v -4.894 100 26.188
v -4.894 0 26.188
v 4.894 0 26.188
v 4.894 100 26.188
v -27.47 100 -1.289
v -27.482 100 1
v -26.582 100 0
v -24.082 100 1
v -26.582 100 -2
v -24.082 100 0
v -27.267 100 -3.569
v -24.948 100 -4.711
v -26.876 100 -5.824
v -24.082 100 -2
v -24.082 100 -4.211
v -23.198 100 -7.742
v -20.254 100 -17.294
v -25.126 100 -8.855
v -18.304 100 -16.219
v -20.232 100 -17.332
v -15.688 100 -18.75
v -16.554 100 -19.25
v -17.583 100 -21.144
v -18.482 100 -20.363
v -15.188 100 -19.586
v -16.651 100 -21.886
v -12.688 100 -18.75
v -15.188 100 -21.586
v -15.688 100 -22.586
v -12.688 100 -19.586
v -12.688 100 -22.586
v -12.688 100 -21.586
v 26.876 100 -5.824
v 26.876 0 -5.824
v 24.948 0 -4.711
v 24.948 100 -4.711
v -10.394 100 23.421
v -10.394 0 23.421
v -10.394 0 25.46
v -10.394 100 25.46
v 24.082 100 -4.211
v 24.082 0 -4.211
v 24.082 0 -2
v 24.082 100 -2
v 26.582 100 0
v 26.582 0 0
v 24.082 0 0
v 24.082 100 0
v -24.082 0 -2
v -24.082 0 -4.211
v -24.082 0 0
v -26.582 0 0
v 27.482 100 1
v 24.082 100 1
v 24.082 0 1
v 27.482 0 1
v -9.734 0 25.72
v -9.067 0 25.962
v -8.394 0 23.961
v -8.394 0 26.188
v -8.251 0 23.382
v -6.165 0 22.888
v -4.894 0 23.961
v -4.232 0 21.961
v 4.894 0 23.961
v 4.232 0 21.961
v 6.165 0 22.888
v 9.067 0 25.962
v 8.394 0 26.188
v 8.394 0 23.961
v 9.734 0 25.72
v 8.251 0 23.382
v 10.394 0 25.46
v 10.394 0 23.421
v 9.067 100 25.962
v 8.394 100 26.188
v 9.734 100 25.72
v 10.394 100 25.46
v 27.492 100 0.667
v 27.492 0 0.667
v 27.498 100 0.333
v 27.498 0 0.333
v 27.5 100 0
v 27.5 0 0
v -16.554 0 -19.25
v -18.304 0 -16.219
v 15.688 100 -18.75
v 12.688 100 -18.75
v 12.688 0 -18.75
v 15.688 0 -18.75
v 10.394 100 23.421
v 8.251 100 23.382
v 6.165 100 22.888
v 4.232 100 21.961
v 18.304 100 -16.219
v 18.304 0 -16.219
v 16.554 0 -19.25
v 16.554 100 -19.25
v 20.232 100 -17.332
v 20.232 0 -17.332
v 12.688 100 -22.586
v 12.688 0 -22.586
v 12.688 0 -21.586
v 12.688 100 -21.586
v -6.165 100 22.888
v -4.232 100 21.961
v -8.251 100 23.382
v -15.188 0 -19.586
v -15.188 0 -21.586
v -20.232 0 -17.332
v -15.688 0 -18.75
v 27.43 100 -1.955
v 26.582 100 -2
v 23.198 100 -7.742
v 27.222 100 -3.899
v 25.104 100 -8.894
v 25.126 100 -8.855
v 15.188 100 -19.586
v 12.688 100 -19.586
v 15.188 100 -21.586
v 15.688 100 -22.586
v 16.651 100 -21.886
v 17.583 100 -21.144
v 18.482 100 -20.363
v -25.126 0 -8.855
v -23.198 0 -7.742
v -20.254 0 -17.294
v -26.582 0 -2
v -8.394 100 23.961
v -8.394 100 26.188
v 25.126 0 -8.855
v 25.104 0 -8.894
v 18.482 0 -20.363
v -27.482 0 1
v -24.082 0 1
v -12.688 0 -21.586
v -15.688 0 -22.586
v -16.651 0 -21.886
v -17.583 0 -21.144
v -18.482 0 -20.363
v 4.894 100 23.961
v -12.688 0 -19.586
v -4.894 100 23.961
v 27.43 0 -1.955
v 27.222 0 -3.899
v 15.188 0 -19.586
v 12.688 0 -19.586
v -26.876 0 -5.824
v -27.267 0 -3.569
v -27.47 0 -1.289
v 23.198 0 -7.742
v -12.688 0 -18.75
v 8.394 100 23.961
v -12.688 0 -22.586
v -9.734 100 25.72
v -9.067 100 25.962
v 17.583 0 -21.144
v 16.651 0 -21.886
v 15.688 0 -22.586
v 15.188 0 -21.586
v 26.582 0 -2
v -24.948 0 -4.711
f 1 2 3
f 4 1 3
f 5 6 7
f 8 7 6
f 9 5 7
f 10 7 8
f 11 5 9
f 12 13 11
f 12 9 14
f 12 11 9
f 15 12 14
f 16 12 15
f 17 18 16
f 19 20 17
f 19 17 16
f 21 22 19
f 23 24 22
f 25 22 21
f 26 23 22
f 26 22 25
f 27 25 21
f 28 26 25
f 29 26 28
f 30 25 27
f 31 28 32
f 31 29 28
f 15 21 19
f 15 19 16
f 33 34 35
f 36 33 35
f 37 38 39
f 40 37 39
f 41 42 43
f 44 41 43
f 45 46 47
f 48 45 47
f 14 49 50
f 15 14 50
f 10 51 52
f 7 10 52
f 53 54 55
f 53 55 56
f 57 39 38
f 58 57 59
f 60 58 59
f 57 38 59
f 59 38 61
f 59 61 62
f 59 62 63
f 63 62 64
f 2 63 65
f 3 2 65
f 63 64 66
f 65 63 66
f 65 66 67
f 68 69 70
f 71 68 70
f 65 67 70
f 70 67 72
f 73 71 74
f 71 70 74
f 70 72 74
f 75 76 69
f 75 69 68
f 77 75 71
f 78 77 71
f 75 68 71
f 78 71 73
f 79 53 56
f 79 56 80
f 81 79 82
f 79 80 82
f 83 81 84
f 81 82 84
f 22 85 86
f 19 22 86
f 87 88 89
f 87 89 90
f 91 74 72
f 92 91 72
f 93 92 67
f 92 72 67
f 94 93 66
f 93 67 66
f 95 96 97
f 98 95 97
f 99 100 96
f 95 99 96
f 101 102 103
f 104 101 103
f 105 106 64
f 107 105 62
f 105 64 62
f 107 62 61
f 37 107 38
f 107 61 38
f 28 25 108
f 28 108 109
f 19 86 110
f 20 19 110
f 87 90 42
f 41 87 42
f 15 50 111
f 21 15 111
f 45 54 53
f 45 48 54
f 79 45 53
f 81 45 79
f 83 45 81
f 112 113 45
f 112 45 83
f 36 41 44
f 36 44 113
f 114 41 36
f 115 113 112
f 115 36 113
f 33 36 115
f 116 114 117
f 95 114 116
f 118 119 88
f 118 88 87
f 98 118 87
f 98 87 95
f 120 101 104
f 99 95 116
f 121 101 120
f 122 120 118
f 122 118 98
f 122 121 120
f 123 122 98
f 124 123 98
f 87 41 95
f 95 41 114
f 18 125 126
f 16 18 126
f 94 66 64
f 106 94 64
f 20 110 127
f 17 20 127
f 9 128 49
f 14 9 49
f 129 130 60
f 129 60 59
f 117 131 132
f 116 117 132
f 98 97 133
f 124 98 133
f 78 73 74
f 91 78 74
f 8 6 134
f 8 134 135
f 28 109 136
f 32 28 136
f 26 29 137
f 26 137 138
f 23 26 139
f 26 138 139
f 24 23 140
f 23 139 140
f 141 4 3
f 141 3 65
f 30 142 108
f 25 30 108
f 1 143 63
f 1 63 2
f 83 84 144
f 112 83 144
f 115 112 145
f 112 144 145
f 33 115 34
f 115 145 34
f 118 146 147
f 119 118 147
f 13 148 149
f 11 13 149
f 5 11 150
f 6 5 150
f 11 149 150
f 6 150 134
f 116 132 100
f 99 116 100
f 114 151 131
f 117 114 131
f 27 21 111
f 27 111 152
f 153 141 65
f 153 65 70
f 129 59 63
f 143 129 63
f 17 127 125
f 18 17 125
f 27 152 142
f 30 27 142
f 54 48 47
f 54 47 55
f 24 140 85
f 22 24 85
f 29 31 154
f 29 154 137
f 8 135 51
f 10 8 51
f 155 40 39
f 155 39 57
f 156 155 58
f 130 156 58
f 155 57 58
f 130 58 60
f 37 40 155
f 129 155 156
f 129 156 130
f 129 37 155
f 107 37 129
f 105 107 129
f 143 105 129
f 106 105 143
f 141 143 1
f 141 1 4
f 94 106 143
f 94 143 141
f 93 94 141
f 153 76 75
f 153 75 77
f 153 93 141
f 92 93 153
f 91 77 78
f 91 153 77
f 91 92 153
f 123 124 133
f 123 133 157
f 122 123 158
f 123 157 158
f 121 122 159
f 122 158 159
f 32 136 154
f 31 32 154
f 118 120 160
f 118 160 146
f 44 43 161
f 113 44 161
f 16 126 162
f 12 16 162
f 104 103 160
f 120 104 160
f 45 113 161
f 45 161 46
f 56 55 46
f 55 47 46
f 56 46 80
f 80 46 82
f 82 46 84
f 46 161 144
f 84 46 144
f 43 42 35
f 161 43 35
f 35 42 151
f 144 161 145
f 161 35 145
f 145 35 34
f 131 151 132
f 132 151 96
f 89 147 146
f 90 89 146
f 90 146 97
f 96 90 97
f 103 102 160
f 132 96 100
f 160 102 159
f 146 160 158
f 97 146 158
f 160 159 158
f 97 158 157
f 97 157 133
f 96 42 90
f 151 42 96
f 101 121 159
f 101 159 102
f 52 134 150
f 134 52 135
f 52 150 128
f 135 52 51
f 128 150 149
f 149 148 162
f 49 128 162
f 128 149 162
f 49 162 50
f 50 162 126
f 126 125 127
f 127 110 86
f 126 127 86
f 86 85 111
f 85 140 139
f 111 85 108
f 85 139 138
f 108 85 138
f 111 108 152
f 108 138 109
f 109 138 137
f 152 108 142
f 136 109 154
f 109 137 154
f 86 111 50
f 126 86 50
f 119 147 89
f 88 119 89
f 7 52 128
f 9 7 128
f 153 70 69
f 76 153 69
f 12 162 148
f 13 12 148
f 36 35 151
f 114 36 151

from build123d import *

# Parameters (mm, degrees)
BOSS_EXTRUDE1_DEPTH = 100


with BuildPart() as part:
    # Sketch1 → Boss-Extrude1 (new body)
    with BuildSketch(Plane(origin=(0, 0, 0), x_dir=(1, 0, 0), z_dir=(0, 1, 0))):
        with BuildLine():
            ThreePointArc((-10.393980876, -25.460069944), (-9.401021566, -25.843196271), (-8.393980876, -26.187613199))
            Line((-8.393980876, -26.187613199), (-8.393980876, -23.960737702))
            Line((-8.393980876, -23.960737702), (-4.893980876, -23.960737702))
            Line((-4.893980876, -23.960737702), (-4.893980876, -26.187613199))
            Line((-4.893980876, -26.187613199), (-4.849695718, -26.187613199))
            Line((-4.849695718, -26.187613199), (4.893980876, -26.187613199))
            Line((4.893980876, -26.187613199), (4.893980876, -23.960737702))
            Line((4.893980876, -23.960737702), (8.393980876, -23.960737702))
            Line((8.393980876, -23.960737702), (8.393980876, -26.187613199))
            ThreePointArc((8.393980876, -26.187613199), (9.401021566, -25.843196271), (10.393980876, -25.460069944))
            Line((10.393980876, -25.460069944), (10.393980876, -23.42069745))
            ThreePointArc((10.393980876, -23.42069745), (7.194462573, -23.191333633), (4.232173124, -21.960737702))
            Line((4.232173124, -21.960737702), (-4.232173124, -21.960737702))
            ThreePointArc((-4.232173124, -21.960737702), (-7.194462573, -23.191333633), (-10.393980876, -23.42069745))
            Line((-10.393980876, -23.42069745), (-10.393980876, -25.460069944))
        make_face()
        with BuildLine():
            Line((24.081572577, -1), (27.481812167, -1))
            ThreePointArc((27.481812167, -1), (27.495452666, -0.500082692), (27.5, 0))
            ThreePointArc((27.5, 0), (27.343587367, 2.928861541), (26.876128733, 5.824405922))
            Line((26.876128733, 5.824405922), (24.947597981, 4.710968174))
            Line((24.947597981, 4.710968174), (23.197597981, 7.742057087))
            Line((23.197597981, 7.742057087), (25.126128733, 8.855494836))
            Line((25.126128733, 8.855494836), (25.103986154, 8.893846907))
            Line((25.103986154, 8.893846907), (20.232147857, 17.332118363))
            Line((20.232147857, 17.332118363), (18.303617105, 16.218680615))
            Line((18.303617105, 16.218680615), (16.553617105, 19.249769528))
            Line((16.553617105, 19.249769528), (18.482147857, 20.363207277))
            ThreePointArc((18.482147857, 20.363207277), (17.120996476, 21.520257426), (15.687591702, 22.586488585))
            Line((15.687591702, 22.586488585), (15.687591702, 18.749769528))
            Line((15.687591702, 18.749769528), (24.081572577, 4.210968174))
            Line((24.081572577, 4.210968174), (24.081572577, 2))
            Line((24.081572577, 2), (26.581572577, 2))
            Line((26.581572577, 2), (26.581572577, 0))
            Line((26.581572577, 0), (24.081572577, 0))
            Line((24.081572577, 0), (24.081572577, -1))
        make_face()
        with BuildLine():
            ThreePointArc((-26.876128733, 5.824405922), (-27.392326732, 2.431138875), (-27.481812167, -1))
            Line((-27.481812167, -1), (-24.081572577, -1))
            Line((-24.081572577, -1), (-24.081572577, 0))
            Line((-24.081572577, 0), (-26.581572577, 0))
            Line((-26.581572577, 0), (-26.581572577, 2))
            Line((-26.581572577, 2), (-24.081572577, 2))
            Line((-24.081572577, 2), (-24.081572577, 4.210968174))
            Line((-24.081572577, 4.210968174), (-15.687591702, 18.749769528))
            Line((-15.687591702, 18.749769528), (-15.687591702, 22.586488585))
            ThreePointArc((-15.687591702, 22.586488585), (-17.120996476, 21.520257426), (-18.482147857, 20.363207277))
            Line((-18.482147857, 20.363207277), (-16.553617105, 19.249769528))
            Line((-16.553617105, 19.249769528), (-18.303617105, 16.218680615))
            Line((-18.303617105, 16.218680615), (-20.232147857, 17.332118363))
            Line((-20.232147857, 17.332118363), (-20.254290436, 17.293766292))
            Line((-20.254290436, 17.293766292), (-25.126128733, 8.855494836))
            Line((-25.126128733, 8.855494836), (-23.197597981, 7.742057087))
            Line((-23.197597981, 7.742057087), (-24.947597981, 4.710968174))
            Line((-24.947597981, 4.710968174), (-26.876128733, 5.824405922))
        make_face()
        Polygon((-12.687591702, 22.586488585), (-15.687591702, 22.586488585), (-15.687591702, 18.749769528), (-12.687591702, 18.749769528), (-12.687591702, 19.586488585), (-15.187591702, 19.586488585), (-15.187591702, 21.586488585), (-12.687591702, 21.586488585), align=None)
        Polygon((15.687591702, 18.749769528), (15.687591702, 22.586488585), (12.687591702, 22.586488585), (12.687591702, 21.586488585), (15.187591702, 21.586488585), (15.187591702, 19.586488585), (12.687591702, 19.586488585), (12.687591702, 18.749769528), align=None)
    extrude(amount=BOSS_EXTRUDE1_DEPTH)


solid = part.part
